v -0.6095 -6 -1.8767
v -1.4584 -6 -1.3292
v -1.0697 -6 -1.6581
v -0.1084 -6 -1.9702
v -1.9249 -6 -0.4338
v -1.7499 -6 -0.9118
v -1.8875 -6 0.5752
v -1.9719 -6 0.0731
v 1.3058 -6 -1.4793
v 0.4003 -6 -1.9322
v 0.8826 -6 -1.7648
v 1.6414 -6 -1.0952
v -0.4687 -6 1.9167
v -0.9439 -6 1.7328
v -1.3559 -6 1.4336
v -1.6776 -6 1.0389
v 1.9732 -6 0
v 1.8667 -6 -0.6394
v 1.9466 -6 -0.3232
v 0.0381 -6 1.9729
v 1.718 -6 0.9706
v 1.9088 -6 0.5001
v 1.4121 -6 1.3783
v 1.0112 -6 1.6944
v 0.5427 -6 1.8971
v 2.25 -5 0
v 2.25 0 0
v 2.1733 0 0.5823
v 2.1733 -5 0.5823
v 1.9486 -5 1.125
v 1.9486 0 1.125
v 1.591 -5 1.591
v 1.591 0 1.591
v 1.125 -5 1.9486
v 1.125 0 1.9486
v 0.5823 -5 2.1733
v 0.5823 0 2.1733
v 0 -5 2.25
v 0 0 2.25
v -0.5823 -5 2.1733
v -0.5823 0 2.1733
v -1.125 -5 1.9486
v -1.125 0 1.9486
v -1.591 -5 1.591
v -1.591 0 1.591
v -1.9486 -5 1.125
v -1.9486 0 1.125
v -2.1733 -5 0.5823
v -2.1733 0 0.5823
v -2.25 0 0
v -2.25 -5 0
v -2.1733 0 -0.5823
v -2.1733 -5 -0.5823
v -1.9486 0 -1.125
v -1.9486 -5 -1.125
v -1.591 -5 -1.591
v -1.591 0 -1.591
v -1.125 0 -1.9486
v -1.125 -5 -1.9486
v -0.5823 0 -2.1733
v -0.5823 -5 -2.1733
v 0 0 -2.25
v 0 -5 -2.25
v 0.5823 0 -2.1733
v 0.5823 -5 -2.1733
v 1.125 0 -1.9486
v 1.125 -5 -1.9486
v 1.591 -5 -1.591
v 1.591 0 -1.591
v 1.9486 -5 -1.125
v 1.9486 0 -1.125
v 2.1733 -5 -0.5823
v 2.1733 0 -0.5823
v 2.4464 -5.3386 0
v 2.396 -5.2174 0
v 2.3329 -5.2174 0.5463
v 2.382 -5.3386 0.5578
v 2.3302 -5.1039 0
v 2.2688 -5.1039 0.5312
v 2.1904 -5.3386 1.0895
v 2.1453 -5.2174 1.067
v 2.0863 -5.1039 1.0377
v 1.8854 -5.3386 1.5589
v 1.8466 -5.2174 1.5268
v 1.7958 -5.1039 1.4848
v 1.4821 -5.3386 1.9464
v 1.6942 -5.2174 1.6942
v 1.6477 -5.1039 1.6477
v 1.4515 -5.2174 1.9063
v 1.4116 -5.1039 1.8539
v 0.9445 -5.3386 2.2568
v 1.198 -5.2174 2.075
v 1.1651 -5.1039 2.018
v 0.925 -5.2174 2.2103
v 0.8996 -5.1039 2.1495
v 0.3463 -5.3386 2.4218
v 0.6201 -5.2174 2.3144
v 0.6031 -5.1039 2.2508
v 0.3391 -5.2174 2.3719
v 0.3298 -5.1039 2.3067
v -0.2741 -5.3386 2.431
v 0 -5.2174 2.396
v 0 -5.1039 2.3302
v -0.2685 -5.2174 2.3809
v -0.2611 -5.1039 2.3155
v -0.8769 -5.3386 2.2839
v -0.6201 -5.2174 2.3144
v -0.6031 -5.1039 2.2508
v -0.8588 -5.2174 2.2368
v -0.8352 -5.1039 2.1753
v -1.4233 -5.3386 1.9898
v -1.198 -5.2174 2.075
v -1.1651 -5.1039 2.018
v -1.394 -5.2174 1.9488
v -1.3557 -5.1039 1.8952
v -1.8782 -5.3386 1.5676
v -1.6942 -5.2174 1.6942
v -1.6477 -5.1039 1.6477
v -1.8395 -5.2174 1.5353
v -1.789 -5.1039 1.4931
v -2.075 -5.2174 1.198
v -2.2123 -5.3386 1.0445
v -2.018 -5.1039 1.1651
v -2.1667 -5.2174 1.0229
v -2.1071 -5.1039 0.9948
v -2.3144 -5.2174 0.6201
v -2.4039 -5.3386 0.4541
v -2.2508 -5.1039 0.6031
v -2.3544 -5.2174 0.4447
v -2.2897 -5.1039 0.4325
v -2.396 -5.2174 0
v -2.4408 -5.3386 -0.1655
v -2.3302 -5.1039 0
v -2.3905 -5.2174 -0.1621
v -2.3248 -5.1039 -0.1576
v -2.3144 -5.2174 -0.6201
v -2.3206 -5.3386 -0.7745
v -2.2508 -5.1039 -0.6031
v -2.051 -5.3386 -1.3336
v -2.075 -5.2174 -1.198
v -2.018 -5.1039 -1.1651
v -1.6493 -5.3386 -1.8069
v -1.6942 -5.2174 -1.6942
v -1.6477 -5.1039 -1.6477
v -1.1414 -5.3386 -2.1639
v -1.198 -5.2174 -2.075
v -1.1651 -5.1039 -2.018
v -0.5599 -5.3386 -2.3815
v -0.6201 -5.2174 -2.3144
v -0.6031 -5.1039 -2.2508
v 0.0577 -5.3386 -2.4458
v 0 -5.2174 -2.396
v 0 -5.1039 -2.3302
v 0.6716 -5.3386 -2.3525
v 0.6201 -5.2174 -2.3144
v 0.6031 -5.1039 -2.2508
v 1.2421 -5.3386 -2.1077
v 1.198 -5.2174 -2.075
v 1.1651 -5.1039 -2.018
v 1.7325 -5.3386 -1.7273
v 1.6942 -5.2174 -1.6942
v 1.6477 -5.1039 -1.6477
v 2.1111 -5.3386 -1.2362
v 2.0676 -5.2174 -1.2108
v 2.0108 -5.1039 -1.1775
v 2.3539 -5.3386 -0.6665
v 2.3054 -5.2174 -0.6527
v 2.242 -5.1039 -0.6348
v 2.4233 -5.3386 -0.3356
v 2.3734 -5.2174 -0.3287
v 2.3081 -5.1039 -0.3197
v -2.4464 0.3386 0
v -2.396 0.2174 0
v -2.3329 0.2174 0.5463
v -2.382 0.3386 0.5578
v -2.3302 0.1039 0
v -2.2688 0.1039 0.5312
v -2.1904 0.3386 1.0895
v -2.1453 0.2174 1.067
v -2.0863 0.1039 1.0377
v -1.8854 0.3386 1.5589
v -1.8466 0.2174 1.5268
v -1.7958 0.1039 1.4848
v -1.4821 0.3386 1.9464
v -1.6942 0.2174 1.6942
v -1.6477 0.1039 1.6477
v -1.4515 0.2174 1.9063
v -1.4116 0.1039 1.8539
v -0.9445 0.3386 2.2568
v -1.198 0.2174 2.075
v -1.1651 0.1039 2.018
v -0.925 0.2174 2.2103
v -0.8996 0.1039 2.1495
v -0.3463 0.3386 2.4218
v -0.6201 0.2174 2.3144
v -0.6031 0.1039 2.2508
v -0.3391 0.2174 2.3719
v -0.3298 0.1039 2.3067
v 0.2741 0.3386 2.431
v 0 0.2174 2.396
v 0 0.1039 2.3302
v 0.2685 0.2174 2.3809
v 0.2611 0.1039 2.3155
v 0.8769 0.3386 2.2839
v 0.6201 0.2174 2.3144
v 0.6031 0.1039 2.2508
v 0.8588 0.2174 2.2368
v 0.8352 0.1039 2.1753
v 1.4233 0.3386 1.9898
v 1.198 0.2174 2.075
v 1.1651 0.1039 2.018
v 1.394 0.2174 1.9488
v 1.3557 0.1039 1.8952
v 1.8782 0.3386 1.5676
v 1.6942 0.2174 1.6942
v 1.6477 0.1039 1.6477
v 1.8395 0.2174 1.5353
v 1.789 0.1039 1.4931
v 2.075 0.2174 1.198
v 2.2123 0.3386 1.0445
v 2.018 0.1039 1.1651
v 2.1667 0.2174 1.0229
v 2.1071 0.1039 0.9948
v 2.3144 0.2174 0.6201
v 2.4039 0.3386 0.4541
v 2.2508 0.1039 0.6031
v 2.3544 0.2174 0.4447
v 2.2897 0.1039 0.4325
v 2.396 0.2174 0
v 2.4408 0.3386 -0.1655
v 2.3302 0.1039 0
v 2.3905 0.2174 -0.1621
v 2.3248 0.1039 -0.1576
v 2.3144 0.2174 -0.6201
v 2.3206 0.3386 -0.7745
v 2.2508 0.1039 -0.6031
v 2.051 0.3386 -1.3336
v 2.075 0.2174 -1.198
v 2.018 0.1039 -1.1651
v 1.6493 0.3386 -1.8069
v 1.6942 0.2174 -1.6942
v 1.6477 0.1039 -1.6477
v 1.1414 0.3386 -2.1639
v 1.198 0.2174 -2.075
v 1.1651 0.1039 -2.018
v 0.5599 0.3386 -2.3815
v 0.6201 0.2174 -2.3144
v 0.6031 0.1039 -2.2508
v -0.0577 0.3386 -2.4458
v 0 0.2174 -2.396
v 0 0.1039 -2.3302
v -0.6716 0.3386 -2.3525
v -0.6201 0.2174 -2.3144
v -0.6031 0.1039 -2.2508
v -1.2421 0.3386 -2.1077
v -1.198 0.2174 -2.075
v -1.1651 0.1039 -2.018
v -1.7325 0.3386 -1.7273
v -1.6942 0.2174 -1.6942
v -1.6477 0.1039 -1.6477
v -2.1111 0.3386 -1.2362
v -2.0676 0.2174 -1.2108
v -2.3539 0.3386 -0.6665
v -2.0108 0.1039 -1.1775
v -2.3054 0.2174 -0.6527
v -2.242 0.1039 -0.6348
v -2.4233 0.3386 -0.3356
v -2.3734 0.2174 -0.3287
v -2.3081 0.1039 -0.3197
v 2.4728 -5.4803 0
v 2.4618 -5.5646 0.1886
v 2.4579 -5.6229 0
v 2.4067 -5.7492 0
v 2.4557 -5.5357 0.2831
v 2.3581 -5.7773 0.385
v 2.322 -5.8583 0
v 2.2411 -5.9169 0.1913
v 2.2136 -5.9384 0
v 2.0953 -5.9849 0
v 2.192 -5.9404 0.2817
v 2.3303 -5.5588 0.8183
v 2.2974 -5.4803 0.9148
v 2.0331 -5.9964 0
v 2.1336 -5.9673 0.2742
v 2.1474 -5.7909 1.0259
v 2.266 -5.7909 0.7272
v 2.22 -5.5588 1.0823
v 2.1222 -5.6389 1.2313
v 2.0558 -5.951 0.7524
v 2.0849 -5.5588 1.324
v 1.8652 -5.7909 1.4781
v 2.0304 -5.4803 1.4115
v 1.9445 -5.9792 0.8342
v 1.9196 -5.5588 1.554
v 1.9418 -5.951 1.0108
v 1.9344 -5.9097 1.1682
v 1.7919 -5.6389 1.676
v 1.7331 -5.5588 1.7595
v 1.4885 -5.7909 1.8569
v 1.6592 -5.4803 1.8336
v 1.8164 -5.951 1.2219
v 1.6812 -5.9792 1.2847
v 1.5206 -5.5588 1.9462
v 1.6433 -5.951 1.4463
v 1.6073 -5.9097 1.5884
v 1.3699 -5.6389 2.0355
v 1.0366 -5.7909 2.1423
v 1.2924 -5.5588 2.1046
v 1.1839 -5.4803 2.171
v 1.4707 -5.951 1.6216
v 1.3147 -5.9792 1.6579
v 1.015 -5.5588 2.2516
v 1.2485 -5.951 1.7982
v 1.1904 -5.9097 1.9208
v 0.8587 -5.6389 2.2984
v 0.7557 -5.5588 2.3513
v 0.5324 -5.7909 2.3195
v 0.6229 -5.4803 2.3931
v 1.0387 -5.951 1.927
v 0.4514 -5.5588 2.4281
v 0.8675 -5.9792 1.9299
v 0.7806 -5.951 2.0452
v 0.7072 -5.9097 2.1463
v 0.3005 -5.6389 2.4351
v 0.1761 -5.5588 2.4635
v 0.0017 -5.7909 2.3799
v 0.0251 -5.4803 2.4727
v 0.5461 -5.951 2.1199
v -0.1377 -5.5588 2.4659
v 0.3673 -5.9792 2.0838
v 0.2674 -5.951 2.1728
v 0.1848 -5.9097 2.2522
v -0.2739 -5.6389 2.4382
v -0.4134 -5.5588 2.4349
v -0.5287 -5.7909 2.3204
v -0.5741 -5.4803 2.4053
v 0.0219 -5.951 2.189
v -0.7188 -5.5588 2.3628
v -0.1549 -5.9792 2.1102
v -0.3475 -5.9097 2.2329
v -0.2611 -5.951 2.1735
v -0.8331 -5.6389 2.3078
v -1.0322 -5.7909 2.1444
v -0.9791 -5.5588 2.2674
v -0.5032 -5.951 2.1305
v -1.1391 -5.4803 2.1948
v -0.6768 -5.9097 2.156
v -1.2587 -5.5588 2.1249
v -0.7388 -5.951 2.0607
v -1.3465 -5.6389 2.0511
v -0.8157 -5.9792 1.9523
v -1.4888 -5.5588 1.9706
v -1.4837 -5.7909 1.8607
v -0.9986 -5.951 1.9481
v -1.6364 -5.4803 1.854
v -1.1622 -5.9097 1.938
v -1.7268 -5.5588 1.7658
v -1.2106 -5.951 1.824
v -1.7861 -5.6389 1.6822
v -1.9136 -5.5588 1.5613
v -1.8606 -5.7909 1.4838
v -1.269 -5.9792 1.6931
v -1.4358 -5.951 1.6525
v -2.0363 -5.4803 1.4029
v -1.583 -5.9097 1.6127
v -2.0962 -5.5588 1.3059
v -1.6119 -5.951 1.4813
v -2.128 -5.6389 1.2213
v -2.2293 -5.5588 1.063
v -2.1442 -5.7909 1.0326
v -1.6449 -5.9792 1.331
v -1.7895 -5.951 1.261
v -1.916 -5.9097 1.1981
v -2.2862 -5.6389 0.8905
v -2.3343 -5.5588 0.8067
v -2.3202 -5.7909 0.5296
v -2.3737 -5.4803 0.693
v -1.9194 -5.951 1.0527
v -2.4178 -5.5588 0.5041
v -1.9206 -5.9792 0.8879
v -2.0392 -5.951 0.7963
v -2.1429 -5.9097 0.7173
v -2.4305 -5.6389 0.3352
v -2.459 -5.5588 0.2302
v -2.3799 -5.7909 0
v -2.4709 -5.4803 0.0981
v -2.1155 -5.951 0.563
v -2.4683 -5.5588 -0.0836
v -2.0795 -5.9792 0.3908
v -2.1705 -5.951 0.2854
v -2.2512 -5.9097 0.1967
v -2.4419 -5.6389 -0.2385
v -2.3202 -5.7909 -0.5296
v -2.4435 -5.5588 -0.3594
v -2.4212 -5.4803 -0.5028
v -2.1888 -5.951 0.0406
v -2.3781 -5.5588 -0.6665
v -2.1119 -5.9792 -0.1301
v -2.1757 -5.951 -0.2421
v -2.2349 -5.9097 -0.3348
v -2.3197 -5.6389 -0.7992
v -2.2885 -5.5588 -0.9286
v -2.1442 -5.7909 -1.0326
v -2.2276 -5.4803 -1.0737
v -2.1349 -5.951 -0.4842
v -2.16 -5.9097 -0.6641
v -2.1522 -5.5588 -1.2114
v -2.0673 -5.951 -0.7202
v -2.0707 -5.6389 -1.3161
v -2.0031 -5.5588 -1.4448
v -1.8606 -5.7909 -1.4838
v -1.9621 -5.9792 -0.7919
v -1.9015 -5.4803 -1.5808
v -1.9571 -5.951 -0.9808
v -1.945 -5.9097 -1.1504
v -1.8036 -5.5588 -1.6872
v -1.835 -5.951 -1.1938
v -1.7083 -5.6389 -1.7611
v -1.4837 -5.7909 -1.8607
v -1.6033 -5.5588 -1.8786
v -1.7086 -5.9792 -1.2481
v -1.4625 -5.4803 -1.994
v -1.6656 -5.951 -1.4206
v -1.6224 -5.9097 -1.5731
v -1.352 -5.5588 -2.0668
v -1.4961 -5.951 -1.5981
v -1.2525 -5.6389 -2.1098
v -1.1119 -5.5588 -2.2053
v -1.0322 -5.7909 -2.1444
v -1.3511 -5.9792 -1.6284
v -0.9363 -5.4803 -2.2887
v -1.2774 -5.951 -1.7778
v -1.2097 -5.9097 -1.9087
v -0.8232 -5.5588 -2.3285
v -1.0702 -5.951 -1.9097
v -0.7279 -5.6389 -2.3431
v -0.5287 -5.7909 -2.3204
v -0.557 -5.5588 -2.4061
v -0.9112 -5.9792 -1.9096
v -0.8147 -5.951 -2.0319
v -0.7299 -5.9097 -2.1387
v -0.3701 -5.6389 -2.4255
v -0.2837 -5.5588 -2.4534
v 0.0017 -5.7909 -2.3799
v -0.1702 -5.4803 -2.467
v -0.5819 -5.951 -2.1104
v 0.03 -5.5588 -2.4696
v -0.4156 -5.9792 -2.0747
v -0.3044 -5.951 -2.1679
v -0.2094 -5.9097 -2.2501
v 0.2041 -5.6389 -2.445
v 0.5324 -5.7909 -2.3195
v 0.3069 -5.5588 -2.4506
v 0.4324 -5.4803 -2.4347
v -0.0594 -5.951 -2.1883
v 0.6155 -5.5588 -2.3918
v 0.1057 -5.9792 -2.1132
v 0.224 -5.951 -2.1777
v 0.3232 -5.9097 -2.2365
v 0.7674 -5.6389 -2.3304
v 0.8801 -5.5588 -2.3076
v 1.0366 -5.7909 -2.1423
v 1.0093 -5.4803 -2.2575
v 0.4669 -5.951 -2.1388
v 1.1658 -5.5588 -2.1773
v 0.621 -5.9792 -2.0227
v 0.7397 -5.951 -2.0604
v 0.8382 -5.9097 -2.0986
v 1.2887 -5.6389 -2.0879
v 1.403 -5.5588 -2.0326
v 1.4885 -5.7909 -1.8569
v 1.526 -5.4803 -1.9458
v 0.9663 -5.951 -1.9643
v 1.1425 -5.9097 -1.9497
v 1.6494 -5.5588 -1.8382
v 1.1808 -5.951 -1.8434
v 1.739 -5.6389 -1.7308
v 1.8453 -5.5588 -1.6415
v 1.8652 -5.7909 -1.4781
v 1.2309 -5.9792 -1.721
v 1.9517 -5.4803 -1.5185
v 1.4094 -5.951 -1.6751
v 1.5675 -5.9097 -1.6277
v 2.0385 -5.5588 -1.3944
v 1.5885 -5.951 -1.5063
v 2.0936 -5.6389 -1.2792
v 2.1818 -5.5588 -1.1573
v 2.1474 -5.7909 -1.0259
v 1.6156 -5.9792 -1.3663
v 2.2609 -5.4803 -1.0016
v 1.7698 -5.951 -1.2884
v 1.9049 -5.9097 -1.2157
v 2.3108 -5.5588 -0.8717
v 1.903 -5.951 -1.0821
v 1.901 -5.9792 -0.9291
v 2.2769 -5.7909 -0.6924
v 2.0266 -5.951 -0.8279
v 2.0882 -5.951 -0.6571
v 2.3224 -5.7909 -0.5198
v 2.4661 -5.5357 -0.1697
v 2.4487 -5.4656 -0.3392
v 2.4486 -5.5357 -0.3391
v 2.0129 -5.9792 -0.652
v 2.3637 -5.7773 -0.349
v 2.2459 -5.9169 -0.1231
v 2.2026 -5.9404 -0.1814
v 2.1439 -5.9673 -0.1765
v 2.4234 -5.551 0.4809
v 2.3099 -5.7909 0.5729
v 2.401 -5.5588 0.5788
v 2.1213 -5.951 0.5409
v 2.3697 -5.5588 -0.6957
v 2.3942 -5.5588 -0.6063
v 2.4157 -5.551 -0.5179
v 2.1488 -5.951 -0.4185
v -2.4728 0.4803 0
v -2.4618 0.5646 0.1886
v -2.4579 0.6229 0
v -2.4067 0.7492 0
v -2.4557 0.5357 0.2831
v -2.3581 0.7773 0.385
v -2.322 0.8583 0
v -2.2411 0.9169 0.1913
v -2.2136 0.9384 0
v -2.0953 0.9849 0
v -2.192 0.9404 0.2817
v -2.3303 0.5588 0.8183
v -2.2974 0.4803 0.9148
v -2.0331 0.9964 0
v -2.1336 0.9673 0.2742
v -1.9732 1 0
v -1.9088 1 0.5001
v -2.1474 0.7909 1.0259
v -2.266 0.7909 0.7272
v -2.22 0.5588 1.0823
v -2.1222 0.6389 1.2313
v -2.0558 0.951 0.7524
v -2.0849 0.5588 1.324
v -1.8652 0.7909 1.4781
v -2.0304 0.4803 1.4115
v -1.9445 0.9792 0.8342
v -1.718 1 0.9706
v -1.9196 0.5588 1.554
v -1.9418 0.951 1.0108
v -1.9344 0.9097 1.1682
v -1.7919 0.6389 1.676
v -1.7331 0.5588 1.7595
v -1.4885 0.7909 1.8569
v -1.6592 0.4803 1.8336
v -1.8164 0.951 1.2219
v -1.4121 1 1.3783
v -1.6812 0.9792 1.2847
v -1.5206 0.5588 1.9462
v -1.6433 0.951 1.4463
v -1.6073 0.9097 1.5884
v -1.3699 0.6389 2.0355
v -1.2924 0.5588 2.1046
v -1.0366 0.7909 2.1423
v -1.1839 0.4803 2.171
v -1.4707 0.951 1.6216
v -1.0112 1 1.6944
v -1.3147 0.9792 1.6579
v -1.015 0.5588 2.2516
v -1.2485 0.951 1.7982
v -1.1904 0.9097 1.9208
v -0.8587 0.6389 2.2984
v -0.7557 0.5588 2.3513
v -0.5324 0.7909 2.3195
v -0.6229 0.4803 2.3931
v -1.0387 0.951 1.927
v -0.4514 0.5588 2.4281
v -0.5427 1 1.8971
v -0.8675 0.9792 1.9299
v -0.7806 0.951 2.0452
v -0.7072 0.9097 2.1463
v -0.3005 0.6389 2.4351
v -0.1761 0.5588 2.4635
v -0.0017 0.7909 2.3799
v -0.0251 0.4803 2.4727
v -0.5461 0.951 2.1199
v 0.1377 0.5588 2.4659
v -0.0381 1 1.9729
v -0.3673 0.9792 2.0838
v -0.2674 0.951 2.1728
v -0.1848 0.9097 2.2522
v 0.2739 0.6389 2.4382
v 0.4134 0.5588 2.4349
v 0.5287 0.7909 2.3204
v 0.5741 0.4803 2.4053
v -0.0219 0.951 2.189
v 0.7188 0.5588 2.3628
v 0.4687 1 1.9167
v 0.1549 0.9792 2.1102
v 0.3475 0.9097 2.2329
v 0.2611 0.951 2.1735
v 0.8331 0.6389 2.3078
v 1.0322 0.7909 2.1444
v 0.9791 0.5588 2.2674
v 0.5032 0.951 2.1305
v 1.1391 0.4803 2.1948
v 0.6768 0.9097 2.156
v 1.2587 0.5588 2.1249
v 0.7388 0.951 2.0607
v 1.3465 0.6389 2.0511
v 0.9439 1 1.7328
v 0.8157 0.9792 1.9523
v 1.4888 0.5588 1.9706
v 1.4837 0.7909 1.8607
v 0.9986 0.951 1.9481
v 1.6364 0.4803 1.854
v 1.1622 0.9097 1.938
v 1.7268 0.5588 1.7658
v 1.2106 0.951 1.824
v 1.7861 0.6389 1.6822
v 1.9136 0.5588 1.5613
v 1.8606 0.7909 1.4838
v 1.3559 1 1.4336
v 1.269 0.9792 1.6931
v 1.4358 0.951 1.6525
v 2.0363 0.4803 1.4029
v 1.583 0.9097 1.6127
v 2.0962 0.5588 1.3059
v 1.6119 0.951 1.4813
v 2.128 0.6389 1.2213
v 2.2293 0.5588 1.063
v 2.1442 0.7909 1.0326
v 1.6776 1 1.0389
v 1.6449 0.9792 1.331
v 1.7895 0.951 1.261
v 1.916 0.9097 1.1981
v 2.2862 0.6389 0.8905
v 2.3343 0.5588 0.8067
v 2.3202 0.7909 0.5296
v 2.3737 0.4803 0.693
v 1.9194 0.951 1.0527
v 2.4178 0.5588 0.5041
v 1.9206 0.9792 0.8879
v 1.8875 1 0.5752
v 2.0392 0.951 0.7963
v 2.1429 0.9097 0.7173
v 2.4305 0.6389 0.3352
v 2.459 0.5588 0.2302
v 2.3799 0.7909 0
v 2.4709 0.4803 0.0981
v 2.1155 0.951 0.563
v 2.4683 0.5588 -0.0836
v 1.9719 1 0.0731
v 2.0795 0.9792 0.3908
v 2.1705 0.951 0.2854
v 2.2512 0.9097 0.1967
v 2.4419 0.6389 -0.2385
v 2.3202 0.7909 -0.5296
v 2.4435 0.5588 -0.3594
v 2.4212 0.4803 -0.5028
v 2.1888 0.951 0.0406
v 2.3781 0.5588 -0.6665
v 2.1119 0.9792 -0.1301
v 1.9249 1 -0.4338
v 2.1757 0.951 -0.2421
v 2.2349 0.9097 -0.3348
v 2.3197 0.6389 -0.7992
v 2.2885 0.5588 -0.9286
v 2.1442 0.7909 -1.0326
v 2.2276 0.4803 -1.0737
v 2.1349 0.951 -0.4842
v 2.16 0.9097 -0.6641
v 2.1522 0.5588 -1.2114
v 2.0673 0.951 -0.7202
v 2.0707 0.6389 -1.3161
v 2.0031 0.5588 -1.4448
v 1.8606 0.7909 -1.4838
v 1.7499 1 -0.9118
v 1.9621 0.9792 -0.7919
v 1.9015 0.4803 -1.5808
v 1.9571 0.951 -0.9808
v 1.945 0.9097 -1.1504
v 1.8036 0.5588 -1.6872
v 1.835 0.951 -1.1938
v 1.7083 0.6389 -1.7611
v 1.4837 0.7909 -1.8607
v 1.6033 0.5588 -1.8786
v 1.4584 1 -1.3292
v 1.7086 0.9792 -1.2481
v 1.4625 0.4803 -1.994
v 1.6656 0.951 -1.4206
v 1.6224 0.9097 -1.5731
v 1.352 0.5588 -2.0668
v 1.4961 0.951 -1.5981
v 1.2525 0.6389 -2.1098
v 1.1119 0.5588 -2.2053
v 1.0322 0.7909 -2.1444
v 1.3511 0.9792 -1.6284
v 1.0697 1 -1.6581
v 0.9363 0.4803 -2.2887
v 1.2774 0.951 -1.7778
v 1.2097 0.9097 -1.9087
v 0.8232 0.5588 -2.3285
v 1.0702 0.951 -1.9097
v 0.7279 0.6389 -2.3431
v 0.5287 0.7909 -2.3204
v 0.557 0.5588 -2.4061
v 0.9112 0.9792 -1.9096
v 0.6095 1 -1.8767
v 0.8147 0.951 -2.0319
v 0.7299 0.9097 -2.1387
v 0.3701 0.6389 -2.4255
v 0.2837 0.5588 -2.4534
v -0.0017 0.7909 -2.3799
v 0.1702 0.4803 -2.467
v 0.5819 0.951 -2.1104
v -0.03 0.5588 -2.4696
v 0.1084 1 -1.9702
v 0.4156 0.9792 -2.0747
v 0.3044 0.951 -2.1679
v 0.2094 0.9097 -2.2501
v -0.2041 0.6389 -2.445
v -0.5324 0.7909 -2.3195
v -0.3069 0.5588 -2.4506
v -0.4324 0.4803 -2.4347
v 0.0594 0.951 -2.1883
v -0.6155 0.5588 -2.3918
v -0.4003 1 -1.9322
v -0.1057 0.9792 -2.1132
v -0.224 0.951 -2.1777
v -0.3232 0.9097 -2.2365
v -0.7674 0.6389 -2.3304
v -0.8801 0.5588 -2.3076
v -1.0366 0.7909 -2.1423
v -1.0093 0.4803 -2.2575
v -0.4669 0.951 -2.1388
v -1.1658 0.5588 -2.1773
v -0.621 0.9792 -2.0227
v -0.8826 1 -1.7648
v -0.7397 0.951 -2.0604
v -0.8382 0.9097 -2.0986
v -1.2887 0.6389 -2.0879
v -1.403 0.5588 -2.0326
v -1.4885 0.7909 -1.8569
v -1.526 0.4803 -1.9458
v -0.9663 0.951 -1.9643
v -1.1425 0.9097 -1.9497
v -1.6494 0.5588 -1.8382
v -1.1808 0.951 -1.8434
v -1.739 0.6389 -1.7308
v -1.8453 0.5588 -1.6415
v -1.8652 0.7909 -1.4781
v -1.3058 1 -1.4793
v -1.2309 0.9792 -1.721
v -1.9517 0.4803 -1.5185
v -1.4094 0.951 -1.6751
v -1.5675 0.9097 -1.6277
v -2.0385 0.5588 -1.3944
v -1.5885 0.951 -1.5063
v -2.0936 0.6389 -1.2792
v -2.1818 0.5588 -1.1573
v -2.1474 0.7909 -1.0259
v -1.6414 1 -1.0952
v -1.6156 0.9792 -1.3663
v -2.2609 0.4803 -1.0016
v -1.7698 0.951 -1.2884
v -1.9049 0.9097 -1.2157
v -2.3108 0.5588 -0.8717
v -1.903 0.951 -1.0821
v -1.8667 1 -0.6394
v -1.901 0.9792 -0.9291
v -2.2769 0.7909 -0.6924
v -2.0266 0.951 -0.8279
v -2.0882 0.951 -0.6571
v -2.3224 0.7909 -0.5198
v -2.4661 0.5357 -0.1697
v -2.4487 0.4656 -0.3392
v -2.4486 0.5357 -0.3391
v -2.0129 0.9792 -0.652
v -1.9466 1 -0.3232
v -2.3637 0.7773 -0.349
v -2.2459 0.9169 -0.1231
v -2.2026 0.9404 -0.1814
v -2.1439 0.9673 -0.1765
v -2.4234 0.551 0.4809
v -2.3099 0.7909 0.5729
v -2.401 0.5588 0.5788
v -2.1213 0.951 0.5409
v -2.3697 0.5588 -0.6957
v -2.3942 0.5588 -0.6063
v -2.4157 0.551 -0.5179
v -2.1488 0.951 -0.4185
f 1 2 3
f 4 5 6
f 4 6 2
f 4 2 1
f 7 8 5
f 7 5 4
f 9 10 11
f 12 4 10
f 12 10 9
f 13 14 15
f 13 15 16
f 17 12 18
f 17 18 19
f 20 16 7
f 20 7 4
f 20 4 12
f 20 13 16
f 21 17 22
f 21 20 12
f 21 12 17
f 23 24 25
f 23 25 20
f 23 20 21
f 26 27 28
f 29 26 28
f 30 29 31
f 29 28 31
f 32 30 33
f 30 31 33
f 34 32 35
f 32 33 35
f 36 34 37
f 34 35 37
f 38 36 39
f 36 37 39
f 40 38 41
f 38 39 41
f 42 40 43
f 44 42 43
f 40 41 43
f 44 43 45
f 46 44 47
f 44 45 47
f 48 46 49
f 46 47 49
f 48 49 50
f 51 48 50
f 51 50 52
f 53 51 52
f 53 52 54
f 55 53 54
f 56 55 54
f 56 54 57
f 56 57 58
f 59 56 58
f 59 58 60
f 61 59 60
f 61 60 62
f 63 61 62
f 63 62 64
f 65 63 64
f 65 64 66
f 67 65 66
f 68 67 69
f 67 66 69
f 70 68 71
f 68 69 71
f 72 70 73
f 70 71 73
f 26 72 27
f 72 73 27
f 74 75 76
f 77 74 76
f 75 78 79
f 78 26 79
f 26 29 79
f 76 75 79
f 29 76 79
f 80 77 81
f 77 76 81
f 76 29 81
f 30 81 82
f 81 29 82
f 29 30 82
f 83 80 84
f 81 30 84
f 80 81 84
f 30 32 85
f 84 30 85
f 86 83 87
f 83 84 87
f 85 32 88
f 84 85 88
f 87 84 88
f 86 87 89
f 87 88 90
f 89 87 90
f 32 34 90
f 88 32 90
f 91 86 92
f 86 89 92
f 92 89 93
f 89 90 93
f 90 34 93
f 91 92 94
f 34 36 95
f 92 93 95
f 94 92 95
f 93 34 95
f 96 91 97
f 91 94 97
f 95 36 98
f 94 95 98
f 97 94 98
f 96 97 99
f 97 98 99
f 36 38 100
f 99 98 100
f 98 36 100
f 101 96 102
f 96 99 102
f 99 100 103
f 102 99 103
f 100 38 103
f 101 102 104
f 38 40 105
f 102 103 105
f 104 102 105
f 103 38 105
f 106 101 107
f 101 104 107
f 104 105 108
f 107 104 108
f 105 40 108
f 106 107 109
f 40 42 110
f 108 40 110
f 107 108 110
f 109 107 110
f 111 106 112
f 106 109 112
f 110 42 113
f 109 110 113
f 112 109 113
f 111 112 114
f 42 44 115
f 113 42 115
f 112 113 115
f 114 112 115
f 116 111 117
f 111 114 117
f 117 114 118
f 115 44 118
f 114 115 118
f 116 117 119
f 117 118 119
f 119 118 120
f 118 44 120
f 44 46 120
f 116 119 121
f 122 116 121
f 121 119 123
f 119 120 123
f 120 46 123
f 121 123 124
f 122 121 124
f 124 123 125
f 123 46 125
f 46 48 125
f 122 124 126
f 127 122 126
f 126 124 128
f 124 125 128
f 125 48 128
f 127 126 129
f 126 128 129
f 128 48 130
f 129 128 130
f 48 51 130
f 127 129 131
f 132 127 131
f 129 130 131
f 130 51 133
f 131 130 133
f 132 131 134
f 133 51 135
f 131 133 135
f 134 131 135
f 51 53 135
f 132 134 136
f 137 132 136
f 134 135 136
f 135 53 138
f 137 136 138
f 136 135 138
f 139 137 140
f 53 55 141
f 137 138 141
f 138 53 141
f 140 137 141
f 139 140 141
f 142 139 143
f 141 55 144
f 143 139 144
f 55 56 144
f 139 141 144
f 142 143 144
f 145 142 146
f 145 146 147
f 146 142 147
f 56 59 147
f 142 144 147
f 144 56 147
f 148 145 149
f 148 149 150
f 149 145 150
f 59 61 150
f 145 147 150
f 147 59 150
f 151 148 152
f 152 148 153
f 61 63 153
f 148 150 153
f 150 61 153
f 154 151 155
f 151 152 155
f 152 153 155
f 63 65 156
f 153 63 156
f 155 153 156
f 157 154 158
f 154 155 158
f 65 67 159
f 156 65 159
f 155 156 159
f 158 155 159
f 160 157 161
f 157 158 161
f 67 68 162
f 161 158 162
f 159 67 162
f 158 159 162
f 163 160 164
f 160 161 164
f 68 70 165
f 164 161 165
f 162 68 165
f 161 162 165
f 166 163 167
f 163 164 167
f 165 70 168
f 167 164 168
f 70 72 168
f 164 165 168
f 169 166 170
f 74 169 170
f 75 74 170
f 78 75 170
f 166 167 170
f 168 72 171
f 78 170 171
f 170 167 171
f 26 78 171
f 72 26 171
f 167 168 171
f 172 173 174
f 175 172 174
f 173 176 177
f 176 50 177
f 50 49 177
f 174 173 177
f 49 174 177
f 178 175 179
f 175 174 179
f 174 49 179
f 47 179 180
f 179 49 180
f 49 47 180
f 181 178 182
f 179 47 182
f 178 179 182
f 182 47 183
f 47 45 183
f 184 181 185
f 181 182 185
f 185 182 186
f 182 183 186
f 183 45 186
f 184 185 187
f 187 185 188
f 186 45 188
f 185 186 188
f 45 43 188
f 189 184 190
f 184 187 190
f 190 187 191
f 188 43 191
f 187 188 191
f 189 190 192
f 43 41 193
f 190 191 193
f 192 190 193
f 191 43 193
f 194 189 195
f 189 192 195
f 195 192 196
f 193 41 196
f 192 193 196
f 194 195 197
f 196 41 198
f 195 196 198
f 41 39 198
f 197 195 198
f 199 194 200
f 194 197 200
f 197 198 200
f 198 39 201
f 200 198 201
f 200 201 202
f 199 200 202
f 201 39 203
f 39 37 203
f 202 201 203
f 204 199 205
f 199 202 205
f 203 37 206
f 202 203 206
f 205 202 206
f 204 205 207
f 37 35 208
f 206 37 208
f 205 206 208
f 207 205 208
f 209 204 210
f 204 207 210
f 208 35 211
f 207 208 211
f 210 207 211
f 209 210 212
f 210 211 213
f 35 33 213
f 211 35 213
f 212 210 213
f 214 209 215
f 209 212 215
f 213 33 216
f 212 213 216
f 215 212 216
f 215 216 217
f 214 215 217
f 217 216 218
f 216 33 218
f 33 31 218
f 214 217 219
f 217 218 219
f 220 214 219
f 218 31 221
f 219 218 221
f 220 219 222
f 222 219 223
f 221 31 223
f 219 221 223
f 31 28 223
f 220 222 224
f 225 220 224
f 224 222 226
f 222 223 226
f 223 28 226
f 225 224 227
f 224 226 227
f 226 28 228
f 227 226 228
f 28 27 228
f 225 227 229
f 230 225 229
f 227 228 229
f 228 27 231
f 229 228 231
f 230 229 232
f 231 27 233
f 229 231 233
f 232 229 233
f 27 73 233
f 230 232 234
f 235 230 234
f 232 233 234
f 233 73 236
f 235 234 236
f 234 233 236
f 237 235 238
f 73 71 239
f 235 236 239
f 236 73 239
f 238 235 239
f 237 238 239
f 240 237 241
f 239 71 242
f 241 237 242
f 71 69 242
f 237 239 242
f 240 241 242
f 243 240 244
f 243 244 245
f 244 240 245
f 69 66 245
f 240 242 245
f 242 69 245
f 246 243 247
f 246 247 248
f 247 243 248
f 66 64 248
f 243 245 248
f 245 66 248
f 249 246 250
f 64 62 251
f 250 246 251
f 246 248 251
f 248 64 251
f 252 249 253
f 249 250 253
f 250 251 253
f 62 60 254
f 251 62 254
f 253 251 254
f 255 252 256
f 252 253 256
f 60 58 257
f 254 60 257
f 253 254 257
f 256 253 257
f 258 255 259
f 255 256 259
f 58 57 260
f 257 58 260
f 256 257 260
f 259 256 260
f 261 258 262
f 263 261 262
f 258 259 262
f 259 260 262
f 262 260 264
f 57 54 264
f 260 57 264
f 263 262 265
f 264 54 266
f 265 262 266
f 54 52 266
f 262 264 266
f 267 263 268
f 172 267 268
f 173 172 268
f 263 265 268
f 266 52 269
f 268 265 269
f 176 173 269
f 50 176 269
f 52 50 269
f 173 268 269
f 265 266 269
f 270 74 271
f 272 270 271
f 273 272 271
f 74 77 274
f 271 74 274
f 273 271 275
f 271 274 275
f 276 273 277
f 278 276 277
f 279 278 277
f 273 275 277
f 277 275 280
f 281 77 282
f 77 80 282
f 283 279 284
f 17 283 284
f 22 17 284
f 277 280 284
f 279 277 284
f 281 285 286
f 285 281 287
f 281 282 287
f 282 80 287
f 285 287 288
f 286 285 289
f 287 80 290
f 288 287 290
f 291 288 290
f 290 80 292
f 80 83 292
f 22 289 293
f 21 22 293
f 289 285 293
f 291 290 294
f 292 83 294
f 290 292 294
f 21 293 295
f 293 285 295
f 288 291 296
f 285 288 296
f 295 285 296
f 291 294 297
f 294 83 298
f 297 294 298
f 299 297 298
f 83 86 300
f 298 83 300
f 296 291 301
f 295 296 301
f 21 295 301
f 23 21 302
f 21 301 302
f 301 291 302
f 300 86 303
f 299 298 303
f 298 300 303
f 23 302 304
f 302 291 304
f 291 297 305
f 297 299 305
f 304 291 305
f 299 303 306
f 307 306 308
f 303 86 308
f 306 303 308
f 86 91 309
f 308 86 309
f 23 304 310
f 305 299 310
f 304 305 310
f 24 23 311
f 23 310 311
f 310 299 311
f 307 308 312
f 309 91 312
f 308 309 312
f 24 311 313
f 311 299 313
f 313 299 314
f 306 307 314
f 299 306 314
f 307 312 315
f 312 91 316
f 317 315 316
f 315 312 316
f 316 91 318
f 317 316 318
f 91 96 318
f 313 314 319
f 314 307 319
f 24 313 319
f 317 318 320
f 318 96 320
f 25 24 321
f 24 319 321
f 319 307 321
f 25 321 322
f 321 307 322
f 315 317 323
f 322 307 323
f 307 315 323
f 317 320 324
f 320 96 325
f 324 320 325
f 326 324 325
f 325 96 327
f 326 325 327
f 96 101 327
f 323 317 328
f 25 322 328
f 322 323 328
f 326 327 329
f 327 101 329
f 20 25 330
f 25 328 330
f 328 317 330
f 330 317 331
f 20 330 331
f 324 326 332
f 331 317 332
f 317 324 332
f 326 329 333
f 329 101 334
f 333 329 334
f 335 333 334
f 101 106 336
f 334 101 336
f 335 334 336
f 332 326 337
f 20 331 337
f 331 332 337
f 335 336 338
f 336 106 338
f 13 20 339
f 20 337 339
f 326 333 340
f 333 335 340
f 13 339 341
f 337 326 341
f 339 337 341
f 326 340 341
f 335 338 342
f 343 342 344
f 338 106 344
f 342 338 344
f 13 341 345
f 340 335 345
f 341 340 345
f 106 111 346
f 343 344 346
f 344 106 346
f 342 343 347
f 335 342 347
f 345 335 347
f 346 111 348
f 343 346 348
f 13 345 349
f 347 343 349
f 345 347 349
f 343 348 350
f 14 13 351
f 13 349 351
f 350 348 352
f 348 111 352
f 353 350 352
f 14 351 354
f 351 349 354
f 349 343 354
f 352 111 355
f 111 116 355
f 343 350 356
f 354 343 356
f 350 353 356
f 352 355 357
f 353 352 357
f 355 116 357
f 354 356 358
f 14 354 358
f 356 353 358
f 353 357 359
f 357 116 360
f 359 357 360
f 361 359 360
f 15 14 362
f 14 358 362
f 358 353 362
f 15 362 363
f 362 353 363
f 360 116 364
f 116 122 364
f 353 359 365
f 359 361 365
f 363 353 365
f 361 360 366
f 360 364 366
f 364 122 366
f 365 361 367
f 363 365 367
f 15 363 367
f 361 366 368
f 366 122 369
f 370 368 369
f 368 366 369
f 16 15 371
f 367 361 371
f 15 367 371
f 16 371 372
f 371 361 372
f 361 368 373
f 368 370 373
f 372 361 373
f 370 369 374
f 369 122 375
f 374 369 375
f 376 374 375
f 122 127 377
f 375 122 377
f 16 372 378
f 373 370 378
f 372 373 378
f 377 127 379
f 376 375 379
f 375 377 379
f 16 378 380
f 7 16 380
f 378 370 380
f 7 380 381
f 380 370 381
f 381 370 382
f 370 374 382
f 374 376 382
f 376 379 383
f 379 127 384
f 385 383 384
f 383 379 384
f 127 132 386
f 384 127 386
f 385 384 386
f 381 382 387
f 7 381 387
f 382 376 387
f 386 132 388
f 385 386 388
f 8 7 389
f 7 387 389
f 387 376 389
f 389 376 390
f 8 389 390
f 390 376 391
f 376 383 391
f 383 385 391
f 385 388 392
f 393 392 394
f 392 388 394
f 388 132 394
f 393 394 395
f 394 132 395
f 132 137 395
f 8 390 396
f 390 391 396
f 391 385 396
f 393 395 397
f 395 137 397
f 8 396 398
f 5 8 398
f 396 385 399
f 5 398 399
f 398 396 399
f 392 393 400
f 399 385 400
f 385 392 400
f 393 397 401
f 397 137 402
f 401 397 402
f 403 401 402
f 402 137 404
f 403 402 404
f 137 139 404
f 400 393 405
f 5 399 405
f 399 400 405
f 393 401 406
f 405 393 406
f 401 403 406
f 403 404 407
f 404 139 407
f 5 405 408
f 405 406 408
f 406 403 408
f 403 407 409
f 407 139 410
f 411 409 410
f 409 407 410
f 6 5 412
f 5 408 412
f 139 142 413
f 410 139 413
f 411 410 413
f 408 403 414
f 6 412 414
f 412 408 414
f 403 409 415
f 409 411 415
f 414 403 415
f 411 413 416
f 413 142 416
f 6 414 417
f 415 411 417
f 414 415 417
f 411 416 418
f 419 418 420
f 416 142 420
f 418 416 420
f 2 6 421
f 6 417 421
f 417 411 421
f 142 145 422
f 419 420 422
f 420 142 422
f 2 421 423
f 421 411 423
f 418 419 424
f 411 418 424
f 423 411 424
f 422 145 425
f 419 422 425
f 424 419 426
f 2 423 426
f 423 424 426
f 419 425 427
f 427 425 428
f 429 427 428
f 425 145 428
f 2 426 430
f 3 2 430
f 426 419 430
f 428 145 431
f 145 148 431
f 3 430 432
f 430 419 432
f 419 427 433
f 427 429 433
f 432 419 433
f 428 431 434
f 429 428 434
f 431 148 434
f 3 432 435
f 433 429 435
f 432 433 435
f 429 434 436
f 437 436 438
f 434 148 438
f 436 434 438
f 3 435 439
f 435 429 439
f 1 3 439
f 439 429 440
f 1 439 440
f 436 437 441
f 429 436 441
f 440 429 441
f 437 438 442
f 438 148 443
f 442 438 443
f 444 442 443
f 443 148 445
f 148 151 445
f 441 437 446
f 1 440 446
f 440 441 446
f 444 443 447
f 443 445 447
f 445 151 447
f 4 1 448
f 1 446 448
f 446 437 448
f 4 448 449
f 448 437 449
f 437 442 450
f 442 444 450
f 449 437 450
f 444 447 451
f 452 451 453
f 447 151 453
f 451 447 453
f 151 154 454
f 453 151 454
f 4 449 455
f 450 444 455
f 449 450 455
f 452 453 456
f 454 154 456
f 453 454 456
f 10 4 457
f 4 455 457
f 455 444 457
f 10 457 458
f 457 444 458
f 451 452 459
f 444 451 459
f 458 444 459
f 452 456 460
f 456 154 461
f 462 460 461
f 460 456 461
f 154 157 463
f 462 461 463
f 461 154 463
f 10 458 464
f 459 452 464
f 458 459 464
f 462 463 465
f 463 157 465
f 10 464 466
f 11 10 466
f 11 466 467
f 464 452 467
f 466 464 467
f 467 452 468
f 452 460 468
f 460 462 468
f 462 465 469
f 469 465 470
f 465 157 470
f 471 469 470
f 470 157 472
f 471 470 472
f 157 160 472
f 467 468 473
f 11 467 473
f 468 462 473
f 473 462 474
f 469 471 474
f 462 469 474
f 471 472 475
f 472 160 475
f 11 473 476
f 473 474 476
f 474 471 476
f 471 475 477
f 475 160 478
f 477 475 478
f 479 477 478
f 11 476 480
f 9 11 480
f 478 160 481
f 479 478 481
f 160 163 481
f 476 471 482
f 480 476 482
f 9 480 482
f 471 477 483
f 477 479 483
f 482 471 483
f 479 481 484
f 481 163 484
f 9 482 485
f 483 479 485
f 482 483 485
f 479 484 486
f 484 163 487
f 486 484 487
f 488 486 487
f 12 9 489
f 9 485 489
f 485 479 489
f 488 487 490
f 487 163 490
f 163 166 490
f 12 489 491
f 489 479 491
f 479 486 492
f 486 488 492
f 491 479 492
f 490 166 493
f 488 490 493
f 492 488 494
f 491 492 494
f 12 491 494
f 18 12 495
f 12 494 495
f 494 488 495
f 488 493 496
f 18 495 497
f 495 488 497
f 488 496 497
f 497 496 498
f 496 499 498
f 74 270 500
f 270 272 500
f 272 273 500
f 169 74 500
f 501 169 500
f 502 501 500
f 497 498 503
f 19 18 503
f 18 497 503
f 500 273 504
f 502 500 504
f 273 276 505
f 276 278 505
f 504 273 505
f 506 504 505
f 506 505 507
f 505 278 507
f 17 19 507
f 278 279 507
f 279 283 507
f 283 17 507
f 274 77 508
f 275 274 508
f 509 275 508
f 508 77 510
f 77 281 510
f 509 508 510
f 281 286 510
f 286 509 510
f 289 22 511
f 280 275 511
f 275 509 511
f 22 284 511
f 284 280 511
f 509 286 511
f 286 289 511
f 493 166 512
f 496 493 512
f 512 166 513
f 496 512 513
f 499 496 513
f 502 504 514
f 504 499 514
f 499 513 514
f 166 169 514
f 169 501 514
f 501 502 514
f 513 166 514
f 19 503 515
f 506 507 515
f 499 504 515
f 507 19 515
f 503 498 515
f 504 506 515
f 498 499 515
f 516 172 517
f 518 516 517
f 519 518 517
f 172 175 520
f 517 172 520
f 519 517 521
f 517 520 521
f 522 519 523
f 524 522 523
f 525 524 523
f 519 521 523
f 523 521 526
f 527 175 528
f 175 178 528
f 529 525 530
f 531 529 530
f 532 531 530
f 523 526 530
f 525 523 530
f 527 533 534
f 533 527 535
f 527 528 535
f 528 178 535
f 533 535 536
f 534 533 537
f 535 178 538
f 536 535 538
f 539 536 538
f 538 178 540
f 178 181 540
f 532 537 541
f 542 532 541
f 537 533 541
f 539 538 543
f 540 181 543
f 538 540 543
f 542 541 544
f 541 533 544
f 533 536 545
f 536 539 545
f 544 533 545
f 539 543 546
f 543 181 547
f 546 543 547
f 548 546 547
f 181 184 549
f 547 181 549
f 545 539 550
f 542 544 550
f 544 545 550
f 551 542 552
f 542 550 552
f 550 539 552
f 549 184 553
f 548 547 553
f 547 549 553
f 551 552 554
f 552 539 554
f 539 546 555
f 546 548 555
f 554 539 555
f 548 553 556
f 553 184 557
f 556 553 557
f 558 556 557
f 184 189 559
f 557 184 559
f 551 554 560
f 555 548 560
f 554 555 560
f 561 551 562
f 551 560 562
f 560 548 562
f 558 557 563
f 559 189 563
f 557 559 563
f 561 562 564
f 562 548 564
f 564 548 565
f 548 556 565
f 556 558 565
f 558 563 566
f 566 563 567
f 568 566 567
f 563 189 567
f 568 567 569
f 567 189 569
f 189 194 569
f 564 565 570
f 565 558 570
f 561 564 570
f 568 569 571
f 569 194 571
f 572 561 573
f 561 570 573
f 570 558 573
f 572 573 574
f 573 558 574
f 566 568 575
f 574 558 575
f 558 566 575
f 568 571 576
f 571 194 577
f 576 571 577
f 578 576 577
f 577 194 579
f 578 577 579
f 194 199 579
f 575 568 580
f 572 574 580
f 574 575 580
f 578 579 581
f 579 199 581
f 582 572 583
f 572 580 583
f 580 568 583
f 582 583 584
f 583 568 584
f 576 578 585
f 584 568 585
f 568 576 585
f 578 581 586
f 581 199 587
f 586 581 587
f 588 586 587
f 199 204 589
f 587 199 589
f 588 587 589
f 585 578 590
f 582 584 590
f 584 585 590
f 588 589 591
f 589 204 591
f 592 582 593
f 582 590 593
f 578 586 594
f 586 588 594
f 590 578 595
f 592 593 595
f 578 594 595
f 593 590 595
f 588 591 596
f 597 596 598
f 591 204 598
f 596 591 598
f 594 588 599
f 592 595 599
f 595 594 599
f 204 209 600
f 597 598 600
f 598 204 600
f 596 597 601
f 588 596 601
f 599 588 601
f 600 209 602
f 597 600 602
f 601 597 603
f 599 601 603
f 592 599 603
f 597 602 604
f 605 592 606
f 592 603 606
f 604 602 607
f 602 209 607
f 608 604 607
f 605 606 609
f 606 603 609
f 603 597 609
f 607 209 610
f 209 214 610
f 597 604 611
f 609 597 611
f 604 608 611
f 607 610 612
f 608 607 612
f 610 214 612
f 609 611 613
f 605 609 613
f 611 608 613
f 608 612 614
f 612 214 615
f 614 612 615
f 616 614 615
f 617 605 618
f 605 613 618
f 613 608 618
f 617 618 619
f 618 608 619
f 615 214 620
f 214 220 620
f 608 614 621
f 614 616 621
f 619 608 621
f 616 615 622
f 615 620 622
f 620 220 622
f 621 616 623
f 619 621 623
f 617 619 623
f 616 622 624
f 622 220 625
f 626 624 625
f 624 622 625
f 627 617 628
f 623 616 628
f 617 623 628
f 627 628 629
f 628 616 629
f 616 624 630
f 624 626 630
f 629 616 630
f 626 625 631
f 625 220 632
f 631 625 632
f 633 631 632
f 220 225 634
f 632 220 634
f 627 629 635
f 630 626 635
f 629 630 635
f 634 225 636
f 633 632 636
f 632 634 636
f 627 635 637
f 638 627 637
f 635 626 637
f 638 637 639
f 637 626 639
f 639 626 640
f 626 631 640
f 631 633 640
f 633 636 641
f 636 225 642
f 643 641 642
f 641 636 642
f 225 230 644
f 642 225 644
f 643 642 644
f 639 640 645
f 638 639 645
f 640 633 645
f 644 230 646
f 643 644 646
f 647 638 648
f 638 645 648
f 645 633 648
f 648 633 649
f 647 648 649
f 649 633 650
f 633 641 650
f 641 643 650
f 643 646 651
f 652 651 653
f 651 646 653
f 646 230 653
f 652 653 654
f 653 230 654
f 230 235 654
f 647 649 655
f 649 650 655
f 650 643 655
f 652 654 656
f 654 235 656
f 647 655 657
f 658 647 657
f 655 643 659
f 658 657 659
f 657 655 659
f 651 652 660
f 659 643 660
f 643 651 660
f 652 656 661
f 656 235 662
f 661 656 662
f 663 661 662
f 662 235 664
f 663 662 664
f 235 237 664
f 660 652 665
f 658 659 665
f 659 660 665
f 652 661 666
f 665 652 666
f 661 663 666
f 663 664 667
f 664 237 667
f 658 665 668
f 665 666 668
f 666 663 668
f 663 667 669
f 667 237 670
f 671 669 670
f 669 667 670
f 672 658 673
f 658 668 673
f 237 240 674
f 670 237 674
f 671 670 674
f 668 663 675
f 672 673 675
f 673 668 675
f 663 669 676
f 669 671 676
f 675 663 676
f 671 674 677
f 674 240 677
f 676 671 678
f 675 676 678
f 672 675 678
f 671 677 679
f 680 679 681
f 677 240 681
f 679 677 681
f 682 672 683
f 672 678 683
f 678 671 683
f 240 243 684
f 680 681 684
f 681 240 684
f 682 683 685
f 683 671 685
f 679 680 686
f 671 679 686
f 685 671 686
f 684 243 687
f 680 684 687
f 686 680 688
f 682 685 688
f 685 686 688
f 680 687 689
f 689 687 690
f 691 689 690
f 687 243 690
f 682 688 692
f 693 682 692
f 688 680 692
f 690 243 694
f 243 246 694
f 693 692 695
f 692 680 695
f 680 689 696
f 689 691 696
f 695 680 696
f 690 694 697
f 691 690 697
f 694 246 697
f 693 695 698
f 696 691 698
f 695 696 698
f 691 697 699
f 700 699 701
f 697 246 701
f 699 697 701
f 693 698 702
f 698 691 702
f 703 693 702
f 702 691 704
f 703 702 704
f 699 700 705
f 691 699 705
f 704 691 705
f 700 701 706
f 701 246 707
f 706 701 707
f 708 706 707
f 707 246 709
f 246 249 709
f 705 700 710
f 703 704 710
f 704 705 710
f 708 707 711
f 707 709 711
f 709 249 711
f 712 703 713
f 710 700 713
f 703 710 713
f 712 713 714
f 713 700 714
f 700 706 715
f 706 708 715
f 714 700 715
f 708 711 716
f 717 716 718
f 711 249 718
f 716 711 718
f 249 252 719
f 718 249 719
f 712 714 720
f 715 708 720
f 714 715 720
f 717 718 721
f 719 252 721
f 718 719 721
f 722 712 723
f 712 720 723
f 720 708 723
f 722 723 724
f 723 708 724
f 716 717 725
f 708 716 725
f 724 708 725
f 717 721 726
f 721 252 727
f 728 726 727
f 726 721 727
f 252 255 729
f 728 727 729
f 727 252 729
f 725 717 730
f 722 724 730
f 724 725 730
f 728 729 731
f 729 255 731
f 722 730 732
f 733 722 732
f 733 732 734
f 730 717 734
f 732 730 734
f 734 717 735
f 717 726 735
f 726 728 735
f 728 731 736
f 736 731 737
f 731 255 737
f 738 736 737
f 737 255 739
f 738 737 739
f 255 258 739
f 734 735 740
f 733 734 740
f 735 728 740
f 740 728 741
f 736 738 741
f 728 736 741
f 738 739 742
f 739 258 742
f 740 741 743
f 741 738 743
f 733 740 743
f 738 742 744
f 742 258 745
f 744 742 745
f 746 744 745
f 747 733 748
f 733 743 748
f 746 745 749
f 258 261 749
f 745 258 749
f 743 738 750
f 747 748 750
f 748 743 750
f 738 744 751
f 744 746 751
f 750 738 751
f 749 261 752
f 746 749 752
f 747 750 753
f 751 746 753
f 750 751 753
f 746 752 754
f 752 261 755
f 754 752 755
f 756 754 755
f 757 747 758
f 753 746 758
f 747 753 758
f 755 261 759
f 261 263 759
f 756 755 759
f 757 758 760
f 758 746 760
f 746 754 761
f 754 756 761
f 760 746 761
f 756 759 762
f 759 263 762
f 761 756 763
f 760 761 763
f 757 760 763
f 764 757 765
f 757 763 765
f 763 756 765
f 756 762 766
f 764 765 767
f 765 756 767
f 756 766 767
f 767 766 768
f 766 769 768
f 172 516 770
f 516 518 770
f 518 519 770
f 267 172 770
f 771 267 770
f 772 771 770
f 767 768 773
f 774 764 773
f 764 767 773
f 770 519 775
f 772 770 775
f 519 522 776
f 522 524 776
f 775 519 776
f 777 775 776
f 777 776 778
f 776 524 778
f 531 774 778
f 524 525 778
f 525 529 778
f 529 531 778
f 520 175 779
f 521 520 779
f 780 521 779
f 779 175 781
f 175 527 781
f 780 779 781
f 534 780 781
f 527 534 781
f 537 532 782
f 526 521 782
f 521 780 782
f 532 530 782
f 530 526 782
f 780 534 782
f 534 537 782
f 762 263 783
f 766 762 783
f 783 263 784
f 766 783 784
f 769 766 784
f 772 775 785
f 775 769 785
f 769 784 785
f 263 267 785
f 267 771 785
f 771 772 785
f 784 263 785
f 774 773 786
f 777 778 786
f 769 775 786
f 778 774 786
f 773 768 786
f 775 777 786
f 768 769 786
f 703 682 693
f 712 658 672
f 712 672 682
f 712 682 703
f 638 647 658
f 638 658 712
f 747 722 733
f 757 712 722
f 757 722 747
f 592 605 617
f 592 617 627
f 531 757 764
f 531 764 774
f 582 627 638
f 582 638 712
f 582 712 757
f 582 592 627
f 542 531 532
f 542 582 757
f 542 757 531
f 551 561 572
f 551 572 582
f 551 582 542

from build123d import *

# Parameters (mm, degrees)
F0_R     = 2.25
F1_DEPTH = 5
F2_R     = 2.5
F2_R_2   = 2.25
F3_DEPTH = 1
F5_R     = 0.5
F6_R     = 2.5
F6_R_2   = 2.25
F7_DEPTH = 1
F9_R     = 0.5


# Not quite as in the source:
# - a fillet or chamfer that OpenCascade refuses, or shapes differently, is made with other operations: its cross-section is extruded or revolved along the edge and cut away or added


with BuildPart() as f1:
    # F0 (on Front) → F1 (new body)
    with BuildSketch(Plane.XZ):
        Circle(F0_R)
    extrude(amount=F1_DEPTH)

    # F2 (on face) → F3 (join)
    with BuildSketch(Plane.XZ.offset(5)):
        Circle(F2_R)
        Circle(F2_R_2, mode=Mode.SUBTRACT)
        Circle(F2_R_2)
    extrude(amount=F3_DEPTH)

    # F4: fillet of radius 1 on 1 edges, made by hand

    # F4_s1 → F4_t2 (revolve, cut)
    with BuildSketch(Plane.XY):
        with BuildLine():
            ThreePointArc((2.5, -5.6614378278), (2.4354143467, -5.3078844372), (2.25, -5))
            Line((2.25, -5), (2.5, -5))
            Line((2.5, -5), (2.5, -5.6614378278))
        make_face()
    revolve(axis=Axis((0, -5, 0), (0, -1, 0)), mode=Mode.SUBTRACT)

    # F5
    f5_edges = [f1.edges().sort_by_distance(p)[0] for p in [
        (-2.5, -6, 0),
    ]]
    fillet(f5_edges, radius=F5_R)

    # F6 (on face) → F7 (join)
    with BuildSketch(Plane(origin=(0, 0, 0), x_dir=(-1, 0, 0), z_dir=(0, 1, 0))):
        Circle(F6_R)
        Circle(F6_R_2, mode=Mode.SUBTRACT)
        Circle(F6_R_2)
    extrude(amount=F7_DEPTH)

    # F8: fillet of radius 1 on 1 edges, made by hand

    # F8_s1 → F8_t2 (revolve, cut)
    with BuildSketch(Plane.XY):
        with BuildLine():
            ThreePointArc((-2.5, 0.6614378278), (-2.4354143467, 0.3078844372), (-2.25, 0))
            Line((-2.25, 0), (-2.5, 0))
            Line((-2.5, 0), (-2.5, 0.6614378278))
        make_face()
    revolve(axis=Axis((0, 0, 0), (0, 1, 0)), mode=Mode.SUBTRACT)

    # F9
    f9_edges = [f1.edges().sort_by_distance(p)[0] for p in [
        (2.5, 1, 0),
    ]]
    fillet(f9_edges, radius=F9_R)


solid = f1.part
